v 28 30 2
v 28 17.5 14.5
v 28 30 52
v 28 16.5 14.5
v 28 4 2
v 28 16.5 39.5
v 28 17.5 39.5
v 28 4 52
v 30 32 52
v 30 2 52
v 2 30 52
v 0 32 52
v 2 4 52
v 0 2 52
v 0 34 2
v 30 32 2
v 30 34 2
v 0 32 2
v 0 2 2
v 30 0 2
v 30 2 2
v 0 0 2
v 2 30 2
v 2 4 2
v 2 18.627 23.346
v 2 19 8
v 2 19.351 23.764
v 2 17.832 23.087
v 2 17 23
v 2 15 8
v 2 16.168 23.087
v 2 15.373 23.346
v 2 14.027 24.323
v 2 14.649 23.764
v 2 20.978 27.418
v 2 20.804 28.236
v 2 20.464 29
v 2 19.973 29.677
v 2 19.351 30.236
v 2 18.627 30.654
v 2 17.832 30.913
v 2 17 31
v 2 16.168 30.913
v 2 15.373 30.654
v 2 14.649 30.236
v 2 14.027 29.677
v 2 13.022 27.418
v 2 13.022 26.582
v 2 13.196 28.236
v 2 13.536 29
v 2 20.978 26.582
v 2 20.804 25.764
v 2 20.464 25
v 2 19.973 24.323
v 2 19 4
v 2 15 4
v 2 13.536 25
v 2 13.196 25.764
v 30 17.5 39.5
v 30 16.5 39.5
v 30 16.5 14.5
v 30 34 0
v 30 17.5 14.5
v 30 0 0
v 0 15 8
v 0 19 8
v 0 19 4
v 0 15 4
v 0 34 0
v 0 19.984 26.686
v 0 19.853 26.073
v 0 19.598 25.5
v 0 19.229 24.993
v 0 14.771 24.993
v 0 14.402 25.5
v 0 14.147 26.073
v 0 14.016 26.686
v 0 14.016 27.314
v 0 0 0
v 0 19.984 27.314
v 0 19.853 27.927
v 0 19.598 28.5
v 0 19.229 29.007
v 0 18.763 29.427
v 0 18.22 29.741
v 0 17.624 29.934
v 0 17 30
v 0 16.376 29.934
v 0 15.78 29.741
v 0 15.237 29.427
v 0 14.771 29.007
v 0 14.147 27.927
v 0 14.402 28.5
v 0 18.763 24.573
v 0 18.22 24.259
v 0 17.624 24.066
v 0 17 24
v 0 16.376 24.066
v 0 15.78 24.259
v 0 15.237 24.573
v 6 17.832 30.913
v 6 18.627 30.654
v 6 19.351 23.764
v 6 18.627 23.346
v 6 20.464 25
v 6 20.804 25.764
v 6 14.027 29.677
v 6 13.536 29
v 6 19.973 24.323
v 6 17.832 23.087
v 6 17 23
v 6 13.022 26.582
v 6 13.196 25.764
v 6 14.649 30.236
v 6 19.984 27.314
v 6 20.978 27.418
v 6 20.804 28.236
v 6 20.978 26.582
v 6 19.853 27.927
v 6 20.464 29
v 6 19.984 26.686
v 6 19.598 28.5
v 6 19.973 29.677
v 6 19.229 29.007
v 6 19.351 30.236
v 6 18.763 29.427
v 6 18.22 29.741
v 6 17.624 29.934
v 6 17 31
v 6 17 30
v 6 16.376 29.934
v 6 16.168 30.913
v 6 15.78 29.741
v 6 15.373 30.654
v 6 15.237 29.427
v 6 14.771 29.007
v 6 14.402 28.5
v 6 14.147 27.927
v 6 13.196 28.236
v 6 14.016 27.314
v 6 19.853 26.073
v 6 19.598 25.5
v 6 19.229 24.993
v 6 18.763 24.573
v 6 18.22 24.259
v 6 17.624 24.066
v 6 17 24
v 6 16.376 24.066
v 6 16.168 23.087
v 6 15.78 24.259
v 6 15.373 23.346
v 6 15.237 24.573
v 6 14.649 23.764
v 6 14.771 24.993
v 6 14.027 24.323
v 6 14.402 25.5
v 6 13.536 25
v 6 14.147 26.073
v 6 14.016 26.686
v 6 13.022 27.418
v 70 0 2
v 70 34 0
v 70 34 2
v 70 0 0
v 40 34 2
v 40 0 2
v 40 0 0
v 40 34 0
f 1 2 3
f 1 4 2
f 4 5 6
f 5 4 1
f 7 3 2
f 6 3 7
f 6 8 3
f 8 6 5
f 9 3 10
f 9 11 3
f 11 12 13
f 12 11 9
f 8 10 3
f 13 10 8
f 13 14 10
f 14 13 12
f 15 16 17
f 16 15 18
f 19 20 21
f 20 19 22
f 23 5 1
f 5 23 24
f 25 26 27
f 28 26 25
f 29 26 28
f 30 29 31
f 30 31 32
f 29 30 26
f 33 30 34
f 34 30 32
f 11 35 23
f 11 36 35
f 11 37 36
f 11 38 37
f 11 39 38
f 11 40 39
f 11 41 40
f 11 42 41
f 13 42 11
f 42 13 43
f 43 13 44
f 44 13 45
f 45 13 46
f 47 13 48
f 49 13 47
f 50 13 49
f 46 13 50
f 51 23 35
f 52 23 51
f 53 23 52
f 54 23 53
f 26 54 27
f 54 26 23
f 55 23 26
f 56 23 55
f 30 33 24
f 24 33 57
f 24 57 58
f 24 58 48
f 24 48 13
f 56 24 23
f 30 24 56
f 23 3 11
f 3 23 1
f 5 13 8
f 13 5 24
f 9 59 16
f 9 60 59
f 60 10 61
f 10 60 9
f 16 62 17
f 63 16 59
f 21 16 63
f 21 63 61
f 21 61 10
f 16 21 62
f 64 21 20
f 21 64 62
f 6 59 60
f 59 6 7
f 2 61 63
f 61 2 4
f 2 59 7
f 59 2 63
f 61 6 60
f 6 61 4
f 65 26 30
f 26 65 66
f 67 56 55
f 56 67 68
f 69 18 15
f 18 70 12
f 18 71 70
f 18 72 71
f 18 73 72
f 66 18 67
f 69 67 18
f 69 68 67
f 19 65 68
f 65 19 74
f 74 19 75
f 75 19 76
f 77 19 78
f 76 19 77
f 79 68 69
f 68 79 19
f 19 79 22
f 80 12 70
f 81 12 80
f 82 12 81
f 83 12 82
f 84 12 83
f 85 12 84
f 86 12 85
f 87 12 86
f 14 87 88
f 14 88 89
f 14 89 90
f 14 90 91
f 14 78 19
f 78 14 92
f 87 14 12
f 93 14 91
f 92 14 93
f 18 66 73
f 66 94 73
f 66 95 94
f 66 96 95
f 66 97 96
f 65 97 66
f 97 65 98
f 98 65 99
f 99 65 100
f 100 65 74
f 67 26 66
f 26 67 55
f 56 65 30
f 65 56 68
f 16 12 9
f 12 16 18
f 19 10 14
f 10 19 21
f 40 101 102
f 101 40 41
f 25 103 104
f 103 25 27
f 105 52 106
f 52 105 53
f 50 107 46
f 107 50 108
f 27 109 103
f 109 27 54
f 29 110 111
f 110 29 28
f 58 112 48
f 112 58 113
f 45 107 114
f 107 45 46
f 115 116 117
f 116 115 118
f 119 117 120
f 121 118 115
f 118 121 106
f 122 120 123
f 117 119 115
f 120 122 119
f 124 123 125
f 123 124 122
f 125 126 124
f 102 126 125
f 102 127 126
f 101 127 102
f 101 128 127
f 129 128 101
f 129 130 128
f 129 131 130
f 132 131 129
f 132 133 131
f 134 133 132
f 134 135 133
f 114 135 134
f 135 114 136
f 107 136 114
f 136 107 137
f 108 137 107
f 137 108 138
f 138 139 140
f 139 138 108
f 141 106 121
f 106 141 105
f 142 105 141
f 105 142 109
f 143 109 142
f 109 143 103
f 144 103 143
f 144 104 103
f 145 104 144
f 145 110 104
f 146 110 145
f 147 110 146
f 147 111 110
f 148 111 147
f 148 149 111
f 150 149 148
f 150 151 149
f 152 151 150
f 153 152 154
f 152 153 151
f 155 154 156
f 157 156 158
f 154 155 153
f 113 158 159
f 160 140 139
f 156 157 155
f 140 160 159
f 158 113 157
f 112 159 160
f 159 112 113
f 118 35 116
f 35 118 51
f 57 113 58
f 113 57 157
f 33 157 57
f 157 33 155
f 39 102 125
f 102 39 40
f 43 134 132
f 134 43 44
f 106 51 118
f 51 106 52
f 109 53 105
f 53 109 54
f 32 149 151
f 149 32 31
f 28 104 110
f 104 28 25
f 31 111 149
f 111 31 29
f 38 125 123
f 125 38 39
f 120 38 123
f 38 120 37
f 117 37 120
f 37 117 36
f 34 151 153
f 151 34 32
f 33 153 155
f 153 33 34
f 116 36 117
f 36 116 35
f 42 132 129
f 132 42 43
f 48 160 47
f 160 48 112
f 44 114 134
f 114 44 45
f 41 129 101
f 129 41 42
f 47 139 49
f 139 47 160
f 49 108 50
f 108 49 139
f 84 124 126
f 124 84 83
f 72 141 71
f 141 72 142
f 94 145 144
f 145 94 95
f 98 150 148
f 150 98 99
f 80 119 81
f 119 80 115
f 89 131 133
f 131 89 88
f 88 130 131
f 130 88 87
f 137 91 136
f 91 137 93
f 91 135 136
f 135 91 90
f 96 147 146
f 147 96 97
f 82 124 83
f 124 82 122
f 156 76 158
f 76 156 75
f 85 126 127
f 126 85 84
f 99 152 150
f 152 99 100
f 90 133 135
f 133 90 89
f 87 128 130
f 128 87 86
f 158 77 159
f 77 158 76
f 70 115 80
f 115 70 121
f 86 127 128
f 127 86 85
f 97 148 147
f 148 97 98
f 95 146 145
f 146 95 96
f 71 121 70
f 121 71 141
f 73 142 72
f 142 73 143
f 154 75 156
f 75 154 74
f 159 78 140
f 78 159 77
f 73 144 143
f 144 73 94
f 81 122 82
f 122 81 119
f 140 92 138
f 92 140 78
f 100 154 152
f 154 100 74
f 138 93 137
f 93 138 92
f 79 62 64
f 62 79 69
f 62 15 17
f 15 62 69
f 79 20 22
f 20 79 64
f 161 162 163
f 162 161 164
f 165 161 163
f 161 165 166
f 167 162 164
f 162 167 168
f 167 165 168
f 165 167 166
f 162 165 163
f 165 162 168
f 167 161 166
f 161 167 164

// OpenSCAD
//import("/home/anveshi/Downloads/receiver.stl");
// this is the cuvette holder
$fn=30;
module box(box_x,box_y,box_z,box_t,win_y,win_z,cyl_r,cyl_h,cyl_t){
    difference(){
        union(){
            difference(){
                cube([box_x,box_y,box_z]);
                union(){
                            //
                            translate([box_t,box_t,0])
                            cube([box_x-(2*box_t),box_y-(2*box_t),box_z]);
                            translate([box_x-box_t,box_y/2-win_y/2,box_z/2-win_z/2])
                    
                            cube([box_t,win_y,win_z]);
                            translate([0,box_y/2-2,box_t])
                            cube([box_t,4,4]); 
                }    
            }
          translate([0,box_y/2,box_z/2])
          rotate(a=90,v=[0,1,0])
          cylinder(r=cyl_r,h=cyl_h);
        }
       translate([0,box_y/2,box_z/2])
       rotate(a=90,v=[0,1,0])
       cylinder(r=cyl_r-1,h=cyl_h);
        
    }
    translate([0,-2,-2])cube([box_x,box_y+2+2,box_t]);
    translate([40,-2,-2])cube([box_x,box_y+2+2,box_t]);
    translate([40,-2,-2])cube([box_x,box_y+2+2,box_t]);
    translate([40,-2,-2])cube([box_x,box_y+2+2,box_t]);
}
translate([0,2,2])box(30,30,50,2,1,25,4,6,1);
